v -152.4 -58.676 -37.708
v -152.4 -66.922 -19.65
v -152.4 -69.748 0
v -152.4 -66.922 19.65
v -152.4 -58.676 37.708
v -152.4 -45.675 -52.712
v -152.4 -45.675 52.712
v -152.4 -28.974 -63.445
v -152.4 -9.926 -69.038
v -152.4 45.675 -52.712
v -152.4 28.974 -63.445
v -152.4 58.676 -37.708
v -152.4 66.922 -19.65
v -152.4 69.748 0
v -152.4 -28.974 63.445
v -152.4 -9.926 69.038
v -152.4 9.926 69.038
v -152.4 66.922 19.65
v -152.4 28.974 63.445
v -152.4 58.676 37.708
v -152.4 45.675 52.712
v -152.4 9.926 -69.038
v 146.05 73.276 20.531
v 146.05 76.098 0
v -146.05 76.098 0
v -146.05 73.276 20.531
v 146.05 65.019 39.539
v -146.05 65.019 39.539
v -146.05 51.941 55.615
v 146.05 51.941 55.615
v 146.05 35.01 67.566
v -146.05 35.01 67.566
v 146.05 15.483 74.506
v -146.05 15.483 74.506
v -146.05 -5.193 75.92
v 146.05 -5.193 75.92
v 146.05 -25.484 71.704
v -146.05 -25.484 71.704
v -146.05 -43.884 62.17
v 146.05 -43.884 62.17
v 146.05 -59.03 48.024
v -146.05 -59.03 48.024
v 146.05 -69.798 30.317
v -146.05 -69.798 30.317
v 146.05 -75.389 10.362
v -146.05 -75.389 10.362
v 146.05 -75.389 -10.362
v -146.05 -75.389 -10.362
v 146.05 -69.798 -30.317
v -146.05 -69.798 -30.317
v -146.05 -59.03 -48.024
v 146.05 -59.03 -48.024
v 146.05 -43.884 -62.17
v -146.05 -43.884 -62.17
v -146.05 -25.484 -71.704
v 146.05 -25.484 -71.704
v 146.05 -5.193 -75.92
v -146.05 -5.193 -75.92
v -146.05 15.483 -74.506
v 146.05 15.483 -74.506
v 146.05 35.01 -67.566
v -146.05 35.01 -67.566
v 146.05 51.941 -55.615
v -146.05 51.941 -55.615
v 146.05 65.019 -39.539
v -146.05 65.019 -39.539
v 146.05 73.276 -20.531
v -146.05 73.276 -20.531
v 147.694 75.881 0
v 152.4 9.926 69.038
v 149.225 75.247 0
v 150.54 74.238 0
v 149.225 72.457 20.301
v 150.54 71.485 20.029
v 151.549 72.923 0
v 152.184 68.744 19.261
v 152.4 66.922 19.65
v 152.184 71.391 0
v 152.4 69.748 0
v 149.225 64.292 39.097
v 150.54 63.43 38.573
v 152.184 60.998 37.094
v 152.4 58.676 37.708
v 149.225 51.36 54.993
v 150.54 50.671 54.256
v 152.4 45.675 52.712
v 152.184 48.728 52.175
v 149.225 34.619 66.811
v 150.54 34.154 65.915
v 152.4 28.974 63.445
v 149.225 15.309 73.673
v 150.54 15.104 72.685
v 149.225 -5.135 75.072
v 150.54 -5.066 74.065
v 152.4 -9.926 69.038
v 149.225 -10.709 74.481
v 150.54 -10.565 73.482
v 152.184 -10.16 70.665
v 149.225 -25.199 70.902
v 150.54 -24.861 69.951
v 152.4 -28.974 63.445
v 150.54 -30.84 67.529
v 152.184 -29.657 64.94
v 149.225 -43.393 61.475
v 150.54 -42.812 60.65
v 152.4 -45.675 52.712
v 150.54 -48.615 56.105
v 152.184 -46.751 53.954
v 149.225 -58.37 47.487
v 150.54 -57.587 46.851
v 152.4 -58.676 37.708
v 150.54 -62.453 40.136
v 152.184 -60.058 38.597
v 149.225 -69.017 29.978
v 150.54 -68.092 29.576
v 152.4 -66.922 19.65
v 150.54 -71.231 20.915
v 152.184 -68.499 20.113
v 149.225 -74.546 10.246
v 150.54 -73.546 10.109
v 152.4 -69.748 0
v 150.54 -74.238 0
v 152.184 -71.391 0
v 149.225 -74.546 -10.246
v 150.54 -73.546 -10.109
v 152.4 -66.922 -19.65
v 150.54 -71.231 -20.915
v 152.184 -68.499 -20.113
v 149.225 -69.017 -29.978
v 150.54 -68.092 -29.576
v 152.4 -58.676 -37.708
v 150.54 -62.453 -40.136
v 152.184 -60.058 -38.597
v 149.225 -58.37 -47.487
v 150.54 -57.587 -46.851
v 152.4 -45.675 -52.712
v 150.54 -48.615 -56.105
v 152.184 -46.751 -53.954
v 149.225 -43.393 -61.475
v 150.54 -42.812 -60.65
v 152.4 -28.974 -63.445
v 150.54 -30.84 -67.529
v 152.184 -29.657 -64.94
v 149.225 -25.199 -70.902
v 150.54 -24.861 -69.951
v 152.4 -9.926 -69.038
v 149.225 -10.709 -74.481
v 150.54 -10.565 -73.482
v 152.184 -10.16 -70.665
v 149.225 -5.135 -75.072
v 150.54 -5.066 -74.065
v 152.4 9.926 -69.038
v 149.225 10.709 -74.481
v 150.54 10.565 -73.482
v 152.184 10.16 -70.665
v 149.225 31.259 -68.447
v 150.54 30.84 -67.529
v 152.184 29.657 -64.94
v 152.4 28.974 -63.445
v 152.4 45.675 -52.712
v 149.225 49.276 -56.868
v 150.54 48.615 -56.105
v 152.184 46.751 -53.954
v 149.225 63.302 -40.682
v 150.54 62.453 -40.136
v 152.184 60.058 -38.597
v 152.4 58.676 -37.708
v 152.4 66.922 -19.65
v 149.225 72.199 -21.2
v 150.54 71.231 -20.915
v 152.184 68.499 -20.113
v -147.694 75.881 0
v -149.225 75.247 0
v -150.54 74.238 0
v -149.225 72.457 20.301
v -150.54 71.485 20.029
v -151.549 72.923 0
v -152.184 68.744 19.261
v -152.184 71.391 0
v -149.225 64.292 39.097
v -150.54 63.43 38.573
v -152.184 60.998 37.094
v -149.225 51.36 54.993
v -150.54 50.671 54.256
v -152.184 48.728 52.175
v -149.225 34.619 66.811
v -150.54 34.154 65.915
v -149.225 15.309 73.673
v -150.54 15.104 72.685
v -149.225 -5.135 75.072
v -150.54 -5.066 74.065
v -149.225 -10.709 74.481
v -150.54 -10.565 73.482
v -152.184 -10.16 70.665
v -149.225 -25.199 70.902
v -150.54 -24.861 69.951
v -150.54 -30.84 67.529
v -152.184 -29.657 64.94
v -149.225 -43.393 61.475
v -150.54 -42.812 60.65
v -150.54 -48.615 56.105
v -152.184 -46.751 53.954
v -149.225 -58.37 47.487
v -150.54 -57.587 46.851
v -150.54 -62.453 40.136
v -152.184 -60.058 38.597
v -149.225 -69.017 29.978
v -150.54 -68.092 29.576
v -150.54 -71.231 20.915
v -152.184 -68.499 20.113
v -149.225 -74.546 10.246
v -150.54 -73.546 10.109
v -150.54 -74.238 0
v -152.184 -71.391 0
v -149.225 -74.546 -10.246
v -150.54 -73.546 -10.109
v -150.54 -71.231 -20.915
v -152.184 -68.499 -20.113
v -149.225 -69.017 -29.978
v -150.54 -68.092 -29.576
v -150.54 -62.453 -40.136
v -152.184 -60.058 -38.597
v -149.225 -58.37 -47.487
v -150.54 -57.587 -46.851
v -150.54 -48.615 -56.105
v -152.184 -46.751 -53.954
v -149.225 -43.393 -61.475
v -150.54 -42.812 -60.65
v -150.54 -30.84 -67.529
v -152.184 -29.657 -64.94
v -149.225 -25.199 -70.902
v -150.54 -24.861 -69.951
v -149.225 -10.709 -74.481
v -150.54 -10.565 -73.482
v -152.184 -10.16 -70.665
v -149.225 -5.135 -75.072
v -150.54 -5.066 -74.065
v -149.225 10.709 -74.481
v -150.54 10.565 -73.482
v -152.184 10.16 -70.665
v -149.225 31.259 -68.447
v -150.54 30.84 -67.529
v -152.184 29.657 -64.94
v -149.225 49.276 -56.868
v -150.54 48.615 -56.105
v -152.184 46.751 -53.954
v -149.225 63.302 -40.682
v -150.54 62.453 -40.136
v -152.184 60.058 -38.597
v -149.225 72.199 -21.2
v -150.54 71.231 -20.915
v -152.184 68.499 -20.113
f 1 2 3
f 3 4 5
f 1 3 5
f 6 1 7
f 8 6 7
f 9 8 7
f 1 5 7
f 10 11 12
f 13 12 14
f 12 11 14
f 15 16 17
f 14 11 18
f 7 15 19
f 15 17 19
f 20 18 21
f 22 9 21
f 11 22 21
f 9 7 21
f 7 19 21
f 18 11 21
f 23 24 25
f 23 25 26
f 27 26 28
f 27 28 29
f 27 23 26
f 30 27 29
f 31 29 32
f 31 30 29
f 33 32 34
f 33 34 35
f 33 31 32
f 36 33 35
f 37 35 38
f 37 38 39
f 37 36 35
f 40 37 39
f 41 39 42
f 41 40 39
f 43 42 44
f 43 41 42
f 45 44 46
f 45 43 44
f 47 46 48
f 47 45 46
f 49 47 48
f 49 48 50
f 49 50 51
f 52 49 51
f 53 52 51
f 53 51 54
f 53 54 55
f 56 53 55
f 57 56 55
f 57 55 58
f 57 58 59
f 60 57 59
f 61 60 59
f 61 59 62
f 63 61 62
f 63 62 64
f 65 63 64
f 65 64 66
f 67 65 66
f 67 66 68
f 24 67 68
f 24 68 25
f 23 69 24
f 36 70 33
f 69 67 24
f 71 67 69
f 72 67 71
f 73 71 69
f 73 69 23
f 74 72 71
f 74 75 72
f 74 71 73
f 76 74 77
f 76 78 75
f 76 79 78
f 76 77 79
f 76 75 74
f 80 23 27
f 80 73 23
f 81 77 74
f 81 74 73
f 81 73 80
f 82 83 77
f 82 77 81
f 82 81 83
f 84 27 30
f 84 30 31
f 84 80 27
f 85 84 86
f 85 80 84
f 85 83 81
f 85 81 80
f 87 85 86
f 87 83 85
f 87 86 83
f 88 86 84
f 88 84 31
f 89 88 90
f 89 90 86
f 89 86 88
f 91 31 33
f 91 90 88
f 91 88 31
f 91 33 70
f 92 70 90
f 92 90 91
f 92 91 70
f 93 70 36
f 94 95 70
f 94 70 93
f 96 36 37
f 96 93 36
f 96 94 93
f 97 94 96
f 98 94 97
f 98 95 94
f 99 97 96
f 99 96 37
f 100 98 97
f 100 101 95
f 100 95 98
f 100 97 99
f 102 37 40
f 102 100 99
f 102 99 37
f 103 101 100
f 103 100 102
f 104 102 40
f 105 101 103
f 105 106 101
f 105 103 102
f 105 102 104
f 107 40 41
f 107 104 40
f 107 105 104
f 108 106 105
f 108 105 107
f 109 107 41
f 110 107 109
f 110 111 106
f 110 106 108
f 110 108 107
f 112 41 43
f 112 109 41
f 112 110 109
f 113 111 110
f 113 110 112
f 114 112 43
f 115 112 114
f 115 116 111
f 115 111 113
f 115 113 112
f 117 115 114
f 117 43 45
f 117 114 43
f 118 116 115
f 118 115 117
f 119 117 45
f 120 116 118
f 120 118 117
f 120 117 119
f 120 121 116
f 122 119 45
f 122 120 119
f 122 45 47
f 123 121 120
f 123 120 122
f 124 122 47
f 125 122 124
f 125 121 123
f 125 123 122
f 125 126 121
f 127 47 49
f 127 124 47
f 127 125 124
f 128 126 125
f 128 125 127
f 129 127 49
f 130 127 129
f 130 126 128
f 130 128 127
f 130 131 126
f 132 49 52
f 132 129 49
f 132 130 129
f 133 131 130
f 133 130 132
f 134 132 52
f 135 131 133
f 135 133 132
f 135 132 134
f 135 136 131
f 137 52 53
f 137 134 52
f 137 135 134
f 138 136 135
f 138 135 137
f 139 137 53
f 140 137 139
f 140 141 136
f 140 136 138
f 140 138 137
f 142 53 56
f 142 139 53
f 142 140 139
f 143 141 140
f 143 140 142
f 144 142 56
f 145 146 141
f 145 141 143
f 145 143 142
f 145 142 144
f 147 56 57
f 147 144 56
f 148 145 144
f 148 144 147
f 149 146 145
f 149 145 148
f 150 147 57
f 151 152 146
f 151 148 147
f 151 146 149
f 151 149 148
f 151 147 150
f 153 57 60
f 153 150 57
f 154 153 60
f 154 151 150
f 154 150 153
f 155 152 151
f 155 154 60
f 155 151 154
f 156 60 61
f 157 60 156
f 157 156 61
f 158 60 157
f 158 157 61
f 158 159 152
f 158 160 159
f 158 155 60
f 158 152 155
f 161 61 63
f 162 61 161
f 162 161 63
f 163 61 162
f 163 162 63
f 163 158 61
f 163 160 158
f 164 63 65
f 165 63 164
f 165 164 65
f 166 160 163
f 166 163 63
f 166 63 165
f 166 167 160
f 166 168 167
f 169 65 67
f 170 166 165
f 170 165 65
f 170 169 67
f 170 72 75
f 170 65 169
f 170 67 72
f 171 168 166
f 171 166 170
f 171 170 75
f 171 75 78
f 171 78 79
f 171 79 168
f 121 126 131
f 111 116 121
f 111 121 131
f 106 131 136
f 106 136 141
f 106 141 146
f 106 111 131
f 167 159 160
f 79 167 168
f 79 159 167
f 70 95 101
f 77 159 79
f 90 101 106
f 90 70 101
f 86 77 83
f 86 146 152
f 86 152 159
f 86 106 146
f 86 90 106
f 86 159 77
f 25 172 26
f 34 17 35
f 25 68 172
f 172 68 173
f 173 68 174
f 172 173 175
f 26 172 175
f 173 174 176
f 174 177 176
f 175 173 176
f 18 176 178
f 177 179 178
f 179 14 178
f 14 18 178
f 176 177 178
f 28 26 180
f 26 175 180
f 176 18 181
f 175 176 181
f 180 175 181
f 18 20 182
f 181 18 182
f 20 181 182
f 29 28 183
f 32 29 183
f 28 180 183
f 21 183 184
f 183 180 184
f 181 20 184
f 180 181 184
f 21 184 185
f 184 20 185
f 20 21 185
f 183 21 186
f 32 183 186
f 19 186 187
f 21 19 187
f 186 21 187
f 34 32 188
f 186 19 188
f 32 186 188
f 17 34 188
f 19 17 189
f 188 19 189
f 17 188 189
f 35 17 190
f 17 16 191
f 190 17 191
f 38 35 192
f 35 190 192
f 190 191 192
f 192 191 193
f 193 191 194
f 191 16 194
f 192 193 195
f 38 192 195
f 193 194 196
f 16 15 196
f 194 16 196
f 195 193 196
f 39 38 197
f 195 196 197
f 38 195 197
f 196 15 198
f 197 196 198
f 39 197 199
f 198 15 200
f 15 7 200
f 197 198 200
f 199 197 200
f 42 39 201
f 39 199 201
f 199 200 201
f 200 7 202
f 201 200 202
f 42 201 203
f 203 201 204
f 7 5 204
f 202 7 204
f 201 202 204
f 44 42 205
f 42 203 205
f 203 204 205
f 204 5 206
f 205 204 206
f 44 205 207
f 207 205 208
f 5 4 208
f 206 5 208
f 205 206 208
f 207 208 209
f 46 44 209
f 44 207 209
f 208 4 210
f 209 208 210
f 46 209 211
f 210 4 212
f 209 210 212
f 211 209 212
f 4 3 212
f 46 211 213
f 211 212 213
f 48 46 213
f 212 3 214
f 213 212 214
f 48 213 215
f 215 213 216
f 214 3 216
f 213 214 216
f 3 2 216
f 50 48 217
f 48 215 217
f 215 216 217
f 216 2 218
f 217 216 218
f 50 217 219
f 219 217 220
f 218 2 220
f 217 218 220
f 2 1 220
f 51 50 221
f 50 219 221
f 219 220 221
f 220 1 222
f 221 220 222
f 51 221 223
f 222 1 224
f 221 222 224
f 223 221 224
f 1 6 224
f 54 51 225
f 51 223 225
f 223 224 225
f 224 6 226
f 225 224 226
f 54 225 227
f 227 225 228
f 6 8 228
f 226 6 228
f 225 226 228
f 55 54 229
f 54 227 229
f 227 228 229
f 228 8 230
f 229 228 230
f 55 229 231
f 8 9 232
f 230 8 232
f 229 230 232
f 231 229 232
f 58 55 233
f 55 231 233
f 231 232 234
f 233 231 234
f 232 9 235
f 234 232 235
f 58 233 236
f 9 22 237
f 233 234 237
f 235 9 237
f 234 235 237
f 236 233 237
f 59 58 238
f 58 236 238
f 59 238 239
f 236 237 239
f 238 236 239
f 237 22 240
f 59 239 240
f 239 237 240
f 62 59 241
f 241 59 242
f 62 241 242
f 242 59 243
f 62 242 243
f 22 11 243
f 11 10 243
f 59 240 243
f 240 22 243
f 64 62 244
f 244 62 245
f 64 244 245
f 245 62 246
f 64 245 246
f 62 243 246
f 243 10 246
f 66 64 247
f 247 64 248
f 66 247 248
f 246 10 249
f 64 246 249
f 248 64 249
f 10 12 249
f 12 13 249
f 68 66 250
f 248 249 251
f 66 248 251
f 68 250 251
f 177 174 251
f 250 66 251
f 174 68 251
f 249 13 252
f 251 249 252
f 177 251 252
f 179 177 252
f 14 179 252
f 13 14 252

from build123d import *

# Parameters (mm, degrees)
F0_R          = 76.09774
F1_DEPTH      = 152.4
F1_DEPTH_BACK = 152.4
F2_R          = 6.35
F3_R          = 6.35


with BuildPart() as f1:
    # F0 (on Right) → F1 (new body, two sides)
    with BuildSketch(Plane.YZ) as f1_sk:
        Circle(F0_R)
    extrude(amount=F1_DEPTH)
    extrude(f1_sk.sketch, amount=-F1_DEPTH_BACK)

    # F2
    f2_edges = [f1.edges().sort_by_distance(p)[0] for p in [
        (152.4, -76.09774, 0),
    ]]
    fillet(f2_edges, radius=F2_R)

    # F3
    f3_edges = [f1.edges().sort_by_distance(p)[0] for p in [
        (-152.4, -76.09774, 0),
    ]]
    fillet(f3_edges, radius=F3_R)


solid = f1.part
